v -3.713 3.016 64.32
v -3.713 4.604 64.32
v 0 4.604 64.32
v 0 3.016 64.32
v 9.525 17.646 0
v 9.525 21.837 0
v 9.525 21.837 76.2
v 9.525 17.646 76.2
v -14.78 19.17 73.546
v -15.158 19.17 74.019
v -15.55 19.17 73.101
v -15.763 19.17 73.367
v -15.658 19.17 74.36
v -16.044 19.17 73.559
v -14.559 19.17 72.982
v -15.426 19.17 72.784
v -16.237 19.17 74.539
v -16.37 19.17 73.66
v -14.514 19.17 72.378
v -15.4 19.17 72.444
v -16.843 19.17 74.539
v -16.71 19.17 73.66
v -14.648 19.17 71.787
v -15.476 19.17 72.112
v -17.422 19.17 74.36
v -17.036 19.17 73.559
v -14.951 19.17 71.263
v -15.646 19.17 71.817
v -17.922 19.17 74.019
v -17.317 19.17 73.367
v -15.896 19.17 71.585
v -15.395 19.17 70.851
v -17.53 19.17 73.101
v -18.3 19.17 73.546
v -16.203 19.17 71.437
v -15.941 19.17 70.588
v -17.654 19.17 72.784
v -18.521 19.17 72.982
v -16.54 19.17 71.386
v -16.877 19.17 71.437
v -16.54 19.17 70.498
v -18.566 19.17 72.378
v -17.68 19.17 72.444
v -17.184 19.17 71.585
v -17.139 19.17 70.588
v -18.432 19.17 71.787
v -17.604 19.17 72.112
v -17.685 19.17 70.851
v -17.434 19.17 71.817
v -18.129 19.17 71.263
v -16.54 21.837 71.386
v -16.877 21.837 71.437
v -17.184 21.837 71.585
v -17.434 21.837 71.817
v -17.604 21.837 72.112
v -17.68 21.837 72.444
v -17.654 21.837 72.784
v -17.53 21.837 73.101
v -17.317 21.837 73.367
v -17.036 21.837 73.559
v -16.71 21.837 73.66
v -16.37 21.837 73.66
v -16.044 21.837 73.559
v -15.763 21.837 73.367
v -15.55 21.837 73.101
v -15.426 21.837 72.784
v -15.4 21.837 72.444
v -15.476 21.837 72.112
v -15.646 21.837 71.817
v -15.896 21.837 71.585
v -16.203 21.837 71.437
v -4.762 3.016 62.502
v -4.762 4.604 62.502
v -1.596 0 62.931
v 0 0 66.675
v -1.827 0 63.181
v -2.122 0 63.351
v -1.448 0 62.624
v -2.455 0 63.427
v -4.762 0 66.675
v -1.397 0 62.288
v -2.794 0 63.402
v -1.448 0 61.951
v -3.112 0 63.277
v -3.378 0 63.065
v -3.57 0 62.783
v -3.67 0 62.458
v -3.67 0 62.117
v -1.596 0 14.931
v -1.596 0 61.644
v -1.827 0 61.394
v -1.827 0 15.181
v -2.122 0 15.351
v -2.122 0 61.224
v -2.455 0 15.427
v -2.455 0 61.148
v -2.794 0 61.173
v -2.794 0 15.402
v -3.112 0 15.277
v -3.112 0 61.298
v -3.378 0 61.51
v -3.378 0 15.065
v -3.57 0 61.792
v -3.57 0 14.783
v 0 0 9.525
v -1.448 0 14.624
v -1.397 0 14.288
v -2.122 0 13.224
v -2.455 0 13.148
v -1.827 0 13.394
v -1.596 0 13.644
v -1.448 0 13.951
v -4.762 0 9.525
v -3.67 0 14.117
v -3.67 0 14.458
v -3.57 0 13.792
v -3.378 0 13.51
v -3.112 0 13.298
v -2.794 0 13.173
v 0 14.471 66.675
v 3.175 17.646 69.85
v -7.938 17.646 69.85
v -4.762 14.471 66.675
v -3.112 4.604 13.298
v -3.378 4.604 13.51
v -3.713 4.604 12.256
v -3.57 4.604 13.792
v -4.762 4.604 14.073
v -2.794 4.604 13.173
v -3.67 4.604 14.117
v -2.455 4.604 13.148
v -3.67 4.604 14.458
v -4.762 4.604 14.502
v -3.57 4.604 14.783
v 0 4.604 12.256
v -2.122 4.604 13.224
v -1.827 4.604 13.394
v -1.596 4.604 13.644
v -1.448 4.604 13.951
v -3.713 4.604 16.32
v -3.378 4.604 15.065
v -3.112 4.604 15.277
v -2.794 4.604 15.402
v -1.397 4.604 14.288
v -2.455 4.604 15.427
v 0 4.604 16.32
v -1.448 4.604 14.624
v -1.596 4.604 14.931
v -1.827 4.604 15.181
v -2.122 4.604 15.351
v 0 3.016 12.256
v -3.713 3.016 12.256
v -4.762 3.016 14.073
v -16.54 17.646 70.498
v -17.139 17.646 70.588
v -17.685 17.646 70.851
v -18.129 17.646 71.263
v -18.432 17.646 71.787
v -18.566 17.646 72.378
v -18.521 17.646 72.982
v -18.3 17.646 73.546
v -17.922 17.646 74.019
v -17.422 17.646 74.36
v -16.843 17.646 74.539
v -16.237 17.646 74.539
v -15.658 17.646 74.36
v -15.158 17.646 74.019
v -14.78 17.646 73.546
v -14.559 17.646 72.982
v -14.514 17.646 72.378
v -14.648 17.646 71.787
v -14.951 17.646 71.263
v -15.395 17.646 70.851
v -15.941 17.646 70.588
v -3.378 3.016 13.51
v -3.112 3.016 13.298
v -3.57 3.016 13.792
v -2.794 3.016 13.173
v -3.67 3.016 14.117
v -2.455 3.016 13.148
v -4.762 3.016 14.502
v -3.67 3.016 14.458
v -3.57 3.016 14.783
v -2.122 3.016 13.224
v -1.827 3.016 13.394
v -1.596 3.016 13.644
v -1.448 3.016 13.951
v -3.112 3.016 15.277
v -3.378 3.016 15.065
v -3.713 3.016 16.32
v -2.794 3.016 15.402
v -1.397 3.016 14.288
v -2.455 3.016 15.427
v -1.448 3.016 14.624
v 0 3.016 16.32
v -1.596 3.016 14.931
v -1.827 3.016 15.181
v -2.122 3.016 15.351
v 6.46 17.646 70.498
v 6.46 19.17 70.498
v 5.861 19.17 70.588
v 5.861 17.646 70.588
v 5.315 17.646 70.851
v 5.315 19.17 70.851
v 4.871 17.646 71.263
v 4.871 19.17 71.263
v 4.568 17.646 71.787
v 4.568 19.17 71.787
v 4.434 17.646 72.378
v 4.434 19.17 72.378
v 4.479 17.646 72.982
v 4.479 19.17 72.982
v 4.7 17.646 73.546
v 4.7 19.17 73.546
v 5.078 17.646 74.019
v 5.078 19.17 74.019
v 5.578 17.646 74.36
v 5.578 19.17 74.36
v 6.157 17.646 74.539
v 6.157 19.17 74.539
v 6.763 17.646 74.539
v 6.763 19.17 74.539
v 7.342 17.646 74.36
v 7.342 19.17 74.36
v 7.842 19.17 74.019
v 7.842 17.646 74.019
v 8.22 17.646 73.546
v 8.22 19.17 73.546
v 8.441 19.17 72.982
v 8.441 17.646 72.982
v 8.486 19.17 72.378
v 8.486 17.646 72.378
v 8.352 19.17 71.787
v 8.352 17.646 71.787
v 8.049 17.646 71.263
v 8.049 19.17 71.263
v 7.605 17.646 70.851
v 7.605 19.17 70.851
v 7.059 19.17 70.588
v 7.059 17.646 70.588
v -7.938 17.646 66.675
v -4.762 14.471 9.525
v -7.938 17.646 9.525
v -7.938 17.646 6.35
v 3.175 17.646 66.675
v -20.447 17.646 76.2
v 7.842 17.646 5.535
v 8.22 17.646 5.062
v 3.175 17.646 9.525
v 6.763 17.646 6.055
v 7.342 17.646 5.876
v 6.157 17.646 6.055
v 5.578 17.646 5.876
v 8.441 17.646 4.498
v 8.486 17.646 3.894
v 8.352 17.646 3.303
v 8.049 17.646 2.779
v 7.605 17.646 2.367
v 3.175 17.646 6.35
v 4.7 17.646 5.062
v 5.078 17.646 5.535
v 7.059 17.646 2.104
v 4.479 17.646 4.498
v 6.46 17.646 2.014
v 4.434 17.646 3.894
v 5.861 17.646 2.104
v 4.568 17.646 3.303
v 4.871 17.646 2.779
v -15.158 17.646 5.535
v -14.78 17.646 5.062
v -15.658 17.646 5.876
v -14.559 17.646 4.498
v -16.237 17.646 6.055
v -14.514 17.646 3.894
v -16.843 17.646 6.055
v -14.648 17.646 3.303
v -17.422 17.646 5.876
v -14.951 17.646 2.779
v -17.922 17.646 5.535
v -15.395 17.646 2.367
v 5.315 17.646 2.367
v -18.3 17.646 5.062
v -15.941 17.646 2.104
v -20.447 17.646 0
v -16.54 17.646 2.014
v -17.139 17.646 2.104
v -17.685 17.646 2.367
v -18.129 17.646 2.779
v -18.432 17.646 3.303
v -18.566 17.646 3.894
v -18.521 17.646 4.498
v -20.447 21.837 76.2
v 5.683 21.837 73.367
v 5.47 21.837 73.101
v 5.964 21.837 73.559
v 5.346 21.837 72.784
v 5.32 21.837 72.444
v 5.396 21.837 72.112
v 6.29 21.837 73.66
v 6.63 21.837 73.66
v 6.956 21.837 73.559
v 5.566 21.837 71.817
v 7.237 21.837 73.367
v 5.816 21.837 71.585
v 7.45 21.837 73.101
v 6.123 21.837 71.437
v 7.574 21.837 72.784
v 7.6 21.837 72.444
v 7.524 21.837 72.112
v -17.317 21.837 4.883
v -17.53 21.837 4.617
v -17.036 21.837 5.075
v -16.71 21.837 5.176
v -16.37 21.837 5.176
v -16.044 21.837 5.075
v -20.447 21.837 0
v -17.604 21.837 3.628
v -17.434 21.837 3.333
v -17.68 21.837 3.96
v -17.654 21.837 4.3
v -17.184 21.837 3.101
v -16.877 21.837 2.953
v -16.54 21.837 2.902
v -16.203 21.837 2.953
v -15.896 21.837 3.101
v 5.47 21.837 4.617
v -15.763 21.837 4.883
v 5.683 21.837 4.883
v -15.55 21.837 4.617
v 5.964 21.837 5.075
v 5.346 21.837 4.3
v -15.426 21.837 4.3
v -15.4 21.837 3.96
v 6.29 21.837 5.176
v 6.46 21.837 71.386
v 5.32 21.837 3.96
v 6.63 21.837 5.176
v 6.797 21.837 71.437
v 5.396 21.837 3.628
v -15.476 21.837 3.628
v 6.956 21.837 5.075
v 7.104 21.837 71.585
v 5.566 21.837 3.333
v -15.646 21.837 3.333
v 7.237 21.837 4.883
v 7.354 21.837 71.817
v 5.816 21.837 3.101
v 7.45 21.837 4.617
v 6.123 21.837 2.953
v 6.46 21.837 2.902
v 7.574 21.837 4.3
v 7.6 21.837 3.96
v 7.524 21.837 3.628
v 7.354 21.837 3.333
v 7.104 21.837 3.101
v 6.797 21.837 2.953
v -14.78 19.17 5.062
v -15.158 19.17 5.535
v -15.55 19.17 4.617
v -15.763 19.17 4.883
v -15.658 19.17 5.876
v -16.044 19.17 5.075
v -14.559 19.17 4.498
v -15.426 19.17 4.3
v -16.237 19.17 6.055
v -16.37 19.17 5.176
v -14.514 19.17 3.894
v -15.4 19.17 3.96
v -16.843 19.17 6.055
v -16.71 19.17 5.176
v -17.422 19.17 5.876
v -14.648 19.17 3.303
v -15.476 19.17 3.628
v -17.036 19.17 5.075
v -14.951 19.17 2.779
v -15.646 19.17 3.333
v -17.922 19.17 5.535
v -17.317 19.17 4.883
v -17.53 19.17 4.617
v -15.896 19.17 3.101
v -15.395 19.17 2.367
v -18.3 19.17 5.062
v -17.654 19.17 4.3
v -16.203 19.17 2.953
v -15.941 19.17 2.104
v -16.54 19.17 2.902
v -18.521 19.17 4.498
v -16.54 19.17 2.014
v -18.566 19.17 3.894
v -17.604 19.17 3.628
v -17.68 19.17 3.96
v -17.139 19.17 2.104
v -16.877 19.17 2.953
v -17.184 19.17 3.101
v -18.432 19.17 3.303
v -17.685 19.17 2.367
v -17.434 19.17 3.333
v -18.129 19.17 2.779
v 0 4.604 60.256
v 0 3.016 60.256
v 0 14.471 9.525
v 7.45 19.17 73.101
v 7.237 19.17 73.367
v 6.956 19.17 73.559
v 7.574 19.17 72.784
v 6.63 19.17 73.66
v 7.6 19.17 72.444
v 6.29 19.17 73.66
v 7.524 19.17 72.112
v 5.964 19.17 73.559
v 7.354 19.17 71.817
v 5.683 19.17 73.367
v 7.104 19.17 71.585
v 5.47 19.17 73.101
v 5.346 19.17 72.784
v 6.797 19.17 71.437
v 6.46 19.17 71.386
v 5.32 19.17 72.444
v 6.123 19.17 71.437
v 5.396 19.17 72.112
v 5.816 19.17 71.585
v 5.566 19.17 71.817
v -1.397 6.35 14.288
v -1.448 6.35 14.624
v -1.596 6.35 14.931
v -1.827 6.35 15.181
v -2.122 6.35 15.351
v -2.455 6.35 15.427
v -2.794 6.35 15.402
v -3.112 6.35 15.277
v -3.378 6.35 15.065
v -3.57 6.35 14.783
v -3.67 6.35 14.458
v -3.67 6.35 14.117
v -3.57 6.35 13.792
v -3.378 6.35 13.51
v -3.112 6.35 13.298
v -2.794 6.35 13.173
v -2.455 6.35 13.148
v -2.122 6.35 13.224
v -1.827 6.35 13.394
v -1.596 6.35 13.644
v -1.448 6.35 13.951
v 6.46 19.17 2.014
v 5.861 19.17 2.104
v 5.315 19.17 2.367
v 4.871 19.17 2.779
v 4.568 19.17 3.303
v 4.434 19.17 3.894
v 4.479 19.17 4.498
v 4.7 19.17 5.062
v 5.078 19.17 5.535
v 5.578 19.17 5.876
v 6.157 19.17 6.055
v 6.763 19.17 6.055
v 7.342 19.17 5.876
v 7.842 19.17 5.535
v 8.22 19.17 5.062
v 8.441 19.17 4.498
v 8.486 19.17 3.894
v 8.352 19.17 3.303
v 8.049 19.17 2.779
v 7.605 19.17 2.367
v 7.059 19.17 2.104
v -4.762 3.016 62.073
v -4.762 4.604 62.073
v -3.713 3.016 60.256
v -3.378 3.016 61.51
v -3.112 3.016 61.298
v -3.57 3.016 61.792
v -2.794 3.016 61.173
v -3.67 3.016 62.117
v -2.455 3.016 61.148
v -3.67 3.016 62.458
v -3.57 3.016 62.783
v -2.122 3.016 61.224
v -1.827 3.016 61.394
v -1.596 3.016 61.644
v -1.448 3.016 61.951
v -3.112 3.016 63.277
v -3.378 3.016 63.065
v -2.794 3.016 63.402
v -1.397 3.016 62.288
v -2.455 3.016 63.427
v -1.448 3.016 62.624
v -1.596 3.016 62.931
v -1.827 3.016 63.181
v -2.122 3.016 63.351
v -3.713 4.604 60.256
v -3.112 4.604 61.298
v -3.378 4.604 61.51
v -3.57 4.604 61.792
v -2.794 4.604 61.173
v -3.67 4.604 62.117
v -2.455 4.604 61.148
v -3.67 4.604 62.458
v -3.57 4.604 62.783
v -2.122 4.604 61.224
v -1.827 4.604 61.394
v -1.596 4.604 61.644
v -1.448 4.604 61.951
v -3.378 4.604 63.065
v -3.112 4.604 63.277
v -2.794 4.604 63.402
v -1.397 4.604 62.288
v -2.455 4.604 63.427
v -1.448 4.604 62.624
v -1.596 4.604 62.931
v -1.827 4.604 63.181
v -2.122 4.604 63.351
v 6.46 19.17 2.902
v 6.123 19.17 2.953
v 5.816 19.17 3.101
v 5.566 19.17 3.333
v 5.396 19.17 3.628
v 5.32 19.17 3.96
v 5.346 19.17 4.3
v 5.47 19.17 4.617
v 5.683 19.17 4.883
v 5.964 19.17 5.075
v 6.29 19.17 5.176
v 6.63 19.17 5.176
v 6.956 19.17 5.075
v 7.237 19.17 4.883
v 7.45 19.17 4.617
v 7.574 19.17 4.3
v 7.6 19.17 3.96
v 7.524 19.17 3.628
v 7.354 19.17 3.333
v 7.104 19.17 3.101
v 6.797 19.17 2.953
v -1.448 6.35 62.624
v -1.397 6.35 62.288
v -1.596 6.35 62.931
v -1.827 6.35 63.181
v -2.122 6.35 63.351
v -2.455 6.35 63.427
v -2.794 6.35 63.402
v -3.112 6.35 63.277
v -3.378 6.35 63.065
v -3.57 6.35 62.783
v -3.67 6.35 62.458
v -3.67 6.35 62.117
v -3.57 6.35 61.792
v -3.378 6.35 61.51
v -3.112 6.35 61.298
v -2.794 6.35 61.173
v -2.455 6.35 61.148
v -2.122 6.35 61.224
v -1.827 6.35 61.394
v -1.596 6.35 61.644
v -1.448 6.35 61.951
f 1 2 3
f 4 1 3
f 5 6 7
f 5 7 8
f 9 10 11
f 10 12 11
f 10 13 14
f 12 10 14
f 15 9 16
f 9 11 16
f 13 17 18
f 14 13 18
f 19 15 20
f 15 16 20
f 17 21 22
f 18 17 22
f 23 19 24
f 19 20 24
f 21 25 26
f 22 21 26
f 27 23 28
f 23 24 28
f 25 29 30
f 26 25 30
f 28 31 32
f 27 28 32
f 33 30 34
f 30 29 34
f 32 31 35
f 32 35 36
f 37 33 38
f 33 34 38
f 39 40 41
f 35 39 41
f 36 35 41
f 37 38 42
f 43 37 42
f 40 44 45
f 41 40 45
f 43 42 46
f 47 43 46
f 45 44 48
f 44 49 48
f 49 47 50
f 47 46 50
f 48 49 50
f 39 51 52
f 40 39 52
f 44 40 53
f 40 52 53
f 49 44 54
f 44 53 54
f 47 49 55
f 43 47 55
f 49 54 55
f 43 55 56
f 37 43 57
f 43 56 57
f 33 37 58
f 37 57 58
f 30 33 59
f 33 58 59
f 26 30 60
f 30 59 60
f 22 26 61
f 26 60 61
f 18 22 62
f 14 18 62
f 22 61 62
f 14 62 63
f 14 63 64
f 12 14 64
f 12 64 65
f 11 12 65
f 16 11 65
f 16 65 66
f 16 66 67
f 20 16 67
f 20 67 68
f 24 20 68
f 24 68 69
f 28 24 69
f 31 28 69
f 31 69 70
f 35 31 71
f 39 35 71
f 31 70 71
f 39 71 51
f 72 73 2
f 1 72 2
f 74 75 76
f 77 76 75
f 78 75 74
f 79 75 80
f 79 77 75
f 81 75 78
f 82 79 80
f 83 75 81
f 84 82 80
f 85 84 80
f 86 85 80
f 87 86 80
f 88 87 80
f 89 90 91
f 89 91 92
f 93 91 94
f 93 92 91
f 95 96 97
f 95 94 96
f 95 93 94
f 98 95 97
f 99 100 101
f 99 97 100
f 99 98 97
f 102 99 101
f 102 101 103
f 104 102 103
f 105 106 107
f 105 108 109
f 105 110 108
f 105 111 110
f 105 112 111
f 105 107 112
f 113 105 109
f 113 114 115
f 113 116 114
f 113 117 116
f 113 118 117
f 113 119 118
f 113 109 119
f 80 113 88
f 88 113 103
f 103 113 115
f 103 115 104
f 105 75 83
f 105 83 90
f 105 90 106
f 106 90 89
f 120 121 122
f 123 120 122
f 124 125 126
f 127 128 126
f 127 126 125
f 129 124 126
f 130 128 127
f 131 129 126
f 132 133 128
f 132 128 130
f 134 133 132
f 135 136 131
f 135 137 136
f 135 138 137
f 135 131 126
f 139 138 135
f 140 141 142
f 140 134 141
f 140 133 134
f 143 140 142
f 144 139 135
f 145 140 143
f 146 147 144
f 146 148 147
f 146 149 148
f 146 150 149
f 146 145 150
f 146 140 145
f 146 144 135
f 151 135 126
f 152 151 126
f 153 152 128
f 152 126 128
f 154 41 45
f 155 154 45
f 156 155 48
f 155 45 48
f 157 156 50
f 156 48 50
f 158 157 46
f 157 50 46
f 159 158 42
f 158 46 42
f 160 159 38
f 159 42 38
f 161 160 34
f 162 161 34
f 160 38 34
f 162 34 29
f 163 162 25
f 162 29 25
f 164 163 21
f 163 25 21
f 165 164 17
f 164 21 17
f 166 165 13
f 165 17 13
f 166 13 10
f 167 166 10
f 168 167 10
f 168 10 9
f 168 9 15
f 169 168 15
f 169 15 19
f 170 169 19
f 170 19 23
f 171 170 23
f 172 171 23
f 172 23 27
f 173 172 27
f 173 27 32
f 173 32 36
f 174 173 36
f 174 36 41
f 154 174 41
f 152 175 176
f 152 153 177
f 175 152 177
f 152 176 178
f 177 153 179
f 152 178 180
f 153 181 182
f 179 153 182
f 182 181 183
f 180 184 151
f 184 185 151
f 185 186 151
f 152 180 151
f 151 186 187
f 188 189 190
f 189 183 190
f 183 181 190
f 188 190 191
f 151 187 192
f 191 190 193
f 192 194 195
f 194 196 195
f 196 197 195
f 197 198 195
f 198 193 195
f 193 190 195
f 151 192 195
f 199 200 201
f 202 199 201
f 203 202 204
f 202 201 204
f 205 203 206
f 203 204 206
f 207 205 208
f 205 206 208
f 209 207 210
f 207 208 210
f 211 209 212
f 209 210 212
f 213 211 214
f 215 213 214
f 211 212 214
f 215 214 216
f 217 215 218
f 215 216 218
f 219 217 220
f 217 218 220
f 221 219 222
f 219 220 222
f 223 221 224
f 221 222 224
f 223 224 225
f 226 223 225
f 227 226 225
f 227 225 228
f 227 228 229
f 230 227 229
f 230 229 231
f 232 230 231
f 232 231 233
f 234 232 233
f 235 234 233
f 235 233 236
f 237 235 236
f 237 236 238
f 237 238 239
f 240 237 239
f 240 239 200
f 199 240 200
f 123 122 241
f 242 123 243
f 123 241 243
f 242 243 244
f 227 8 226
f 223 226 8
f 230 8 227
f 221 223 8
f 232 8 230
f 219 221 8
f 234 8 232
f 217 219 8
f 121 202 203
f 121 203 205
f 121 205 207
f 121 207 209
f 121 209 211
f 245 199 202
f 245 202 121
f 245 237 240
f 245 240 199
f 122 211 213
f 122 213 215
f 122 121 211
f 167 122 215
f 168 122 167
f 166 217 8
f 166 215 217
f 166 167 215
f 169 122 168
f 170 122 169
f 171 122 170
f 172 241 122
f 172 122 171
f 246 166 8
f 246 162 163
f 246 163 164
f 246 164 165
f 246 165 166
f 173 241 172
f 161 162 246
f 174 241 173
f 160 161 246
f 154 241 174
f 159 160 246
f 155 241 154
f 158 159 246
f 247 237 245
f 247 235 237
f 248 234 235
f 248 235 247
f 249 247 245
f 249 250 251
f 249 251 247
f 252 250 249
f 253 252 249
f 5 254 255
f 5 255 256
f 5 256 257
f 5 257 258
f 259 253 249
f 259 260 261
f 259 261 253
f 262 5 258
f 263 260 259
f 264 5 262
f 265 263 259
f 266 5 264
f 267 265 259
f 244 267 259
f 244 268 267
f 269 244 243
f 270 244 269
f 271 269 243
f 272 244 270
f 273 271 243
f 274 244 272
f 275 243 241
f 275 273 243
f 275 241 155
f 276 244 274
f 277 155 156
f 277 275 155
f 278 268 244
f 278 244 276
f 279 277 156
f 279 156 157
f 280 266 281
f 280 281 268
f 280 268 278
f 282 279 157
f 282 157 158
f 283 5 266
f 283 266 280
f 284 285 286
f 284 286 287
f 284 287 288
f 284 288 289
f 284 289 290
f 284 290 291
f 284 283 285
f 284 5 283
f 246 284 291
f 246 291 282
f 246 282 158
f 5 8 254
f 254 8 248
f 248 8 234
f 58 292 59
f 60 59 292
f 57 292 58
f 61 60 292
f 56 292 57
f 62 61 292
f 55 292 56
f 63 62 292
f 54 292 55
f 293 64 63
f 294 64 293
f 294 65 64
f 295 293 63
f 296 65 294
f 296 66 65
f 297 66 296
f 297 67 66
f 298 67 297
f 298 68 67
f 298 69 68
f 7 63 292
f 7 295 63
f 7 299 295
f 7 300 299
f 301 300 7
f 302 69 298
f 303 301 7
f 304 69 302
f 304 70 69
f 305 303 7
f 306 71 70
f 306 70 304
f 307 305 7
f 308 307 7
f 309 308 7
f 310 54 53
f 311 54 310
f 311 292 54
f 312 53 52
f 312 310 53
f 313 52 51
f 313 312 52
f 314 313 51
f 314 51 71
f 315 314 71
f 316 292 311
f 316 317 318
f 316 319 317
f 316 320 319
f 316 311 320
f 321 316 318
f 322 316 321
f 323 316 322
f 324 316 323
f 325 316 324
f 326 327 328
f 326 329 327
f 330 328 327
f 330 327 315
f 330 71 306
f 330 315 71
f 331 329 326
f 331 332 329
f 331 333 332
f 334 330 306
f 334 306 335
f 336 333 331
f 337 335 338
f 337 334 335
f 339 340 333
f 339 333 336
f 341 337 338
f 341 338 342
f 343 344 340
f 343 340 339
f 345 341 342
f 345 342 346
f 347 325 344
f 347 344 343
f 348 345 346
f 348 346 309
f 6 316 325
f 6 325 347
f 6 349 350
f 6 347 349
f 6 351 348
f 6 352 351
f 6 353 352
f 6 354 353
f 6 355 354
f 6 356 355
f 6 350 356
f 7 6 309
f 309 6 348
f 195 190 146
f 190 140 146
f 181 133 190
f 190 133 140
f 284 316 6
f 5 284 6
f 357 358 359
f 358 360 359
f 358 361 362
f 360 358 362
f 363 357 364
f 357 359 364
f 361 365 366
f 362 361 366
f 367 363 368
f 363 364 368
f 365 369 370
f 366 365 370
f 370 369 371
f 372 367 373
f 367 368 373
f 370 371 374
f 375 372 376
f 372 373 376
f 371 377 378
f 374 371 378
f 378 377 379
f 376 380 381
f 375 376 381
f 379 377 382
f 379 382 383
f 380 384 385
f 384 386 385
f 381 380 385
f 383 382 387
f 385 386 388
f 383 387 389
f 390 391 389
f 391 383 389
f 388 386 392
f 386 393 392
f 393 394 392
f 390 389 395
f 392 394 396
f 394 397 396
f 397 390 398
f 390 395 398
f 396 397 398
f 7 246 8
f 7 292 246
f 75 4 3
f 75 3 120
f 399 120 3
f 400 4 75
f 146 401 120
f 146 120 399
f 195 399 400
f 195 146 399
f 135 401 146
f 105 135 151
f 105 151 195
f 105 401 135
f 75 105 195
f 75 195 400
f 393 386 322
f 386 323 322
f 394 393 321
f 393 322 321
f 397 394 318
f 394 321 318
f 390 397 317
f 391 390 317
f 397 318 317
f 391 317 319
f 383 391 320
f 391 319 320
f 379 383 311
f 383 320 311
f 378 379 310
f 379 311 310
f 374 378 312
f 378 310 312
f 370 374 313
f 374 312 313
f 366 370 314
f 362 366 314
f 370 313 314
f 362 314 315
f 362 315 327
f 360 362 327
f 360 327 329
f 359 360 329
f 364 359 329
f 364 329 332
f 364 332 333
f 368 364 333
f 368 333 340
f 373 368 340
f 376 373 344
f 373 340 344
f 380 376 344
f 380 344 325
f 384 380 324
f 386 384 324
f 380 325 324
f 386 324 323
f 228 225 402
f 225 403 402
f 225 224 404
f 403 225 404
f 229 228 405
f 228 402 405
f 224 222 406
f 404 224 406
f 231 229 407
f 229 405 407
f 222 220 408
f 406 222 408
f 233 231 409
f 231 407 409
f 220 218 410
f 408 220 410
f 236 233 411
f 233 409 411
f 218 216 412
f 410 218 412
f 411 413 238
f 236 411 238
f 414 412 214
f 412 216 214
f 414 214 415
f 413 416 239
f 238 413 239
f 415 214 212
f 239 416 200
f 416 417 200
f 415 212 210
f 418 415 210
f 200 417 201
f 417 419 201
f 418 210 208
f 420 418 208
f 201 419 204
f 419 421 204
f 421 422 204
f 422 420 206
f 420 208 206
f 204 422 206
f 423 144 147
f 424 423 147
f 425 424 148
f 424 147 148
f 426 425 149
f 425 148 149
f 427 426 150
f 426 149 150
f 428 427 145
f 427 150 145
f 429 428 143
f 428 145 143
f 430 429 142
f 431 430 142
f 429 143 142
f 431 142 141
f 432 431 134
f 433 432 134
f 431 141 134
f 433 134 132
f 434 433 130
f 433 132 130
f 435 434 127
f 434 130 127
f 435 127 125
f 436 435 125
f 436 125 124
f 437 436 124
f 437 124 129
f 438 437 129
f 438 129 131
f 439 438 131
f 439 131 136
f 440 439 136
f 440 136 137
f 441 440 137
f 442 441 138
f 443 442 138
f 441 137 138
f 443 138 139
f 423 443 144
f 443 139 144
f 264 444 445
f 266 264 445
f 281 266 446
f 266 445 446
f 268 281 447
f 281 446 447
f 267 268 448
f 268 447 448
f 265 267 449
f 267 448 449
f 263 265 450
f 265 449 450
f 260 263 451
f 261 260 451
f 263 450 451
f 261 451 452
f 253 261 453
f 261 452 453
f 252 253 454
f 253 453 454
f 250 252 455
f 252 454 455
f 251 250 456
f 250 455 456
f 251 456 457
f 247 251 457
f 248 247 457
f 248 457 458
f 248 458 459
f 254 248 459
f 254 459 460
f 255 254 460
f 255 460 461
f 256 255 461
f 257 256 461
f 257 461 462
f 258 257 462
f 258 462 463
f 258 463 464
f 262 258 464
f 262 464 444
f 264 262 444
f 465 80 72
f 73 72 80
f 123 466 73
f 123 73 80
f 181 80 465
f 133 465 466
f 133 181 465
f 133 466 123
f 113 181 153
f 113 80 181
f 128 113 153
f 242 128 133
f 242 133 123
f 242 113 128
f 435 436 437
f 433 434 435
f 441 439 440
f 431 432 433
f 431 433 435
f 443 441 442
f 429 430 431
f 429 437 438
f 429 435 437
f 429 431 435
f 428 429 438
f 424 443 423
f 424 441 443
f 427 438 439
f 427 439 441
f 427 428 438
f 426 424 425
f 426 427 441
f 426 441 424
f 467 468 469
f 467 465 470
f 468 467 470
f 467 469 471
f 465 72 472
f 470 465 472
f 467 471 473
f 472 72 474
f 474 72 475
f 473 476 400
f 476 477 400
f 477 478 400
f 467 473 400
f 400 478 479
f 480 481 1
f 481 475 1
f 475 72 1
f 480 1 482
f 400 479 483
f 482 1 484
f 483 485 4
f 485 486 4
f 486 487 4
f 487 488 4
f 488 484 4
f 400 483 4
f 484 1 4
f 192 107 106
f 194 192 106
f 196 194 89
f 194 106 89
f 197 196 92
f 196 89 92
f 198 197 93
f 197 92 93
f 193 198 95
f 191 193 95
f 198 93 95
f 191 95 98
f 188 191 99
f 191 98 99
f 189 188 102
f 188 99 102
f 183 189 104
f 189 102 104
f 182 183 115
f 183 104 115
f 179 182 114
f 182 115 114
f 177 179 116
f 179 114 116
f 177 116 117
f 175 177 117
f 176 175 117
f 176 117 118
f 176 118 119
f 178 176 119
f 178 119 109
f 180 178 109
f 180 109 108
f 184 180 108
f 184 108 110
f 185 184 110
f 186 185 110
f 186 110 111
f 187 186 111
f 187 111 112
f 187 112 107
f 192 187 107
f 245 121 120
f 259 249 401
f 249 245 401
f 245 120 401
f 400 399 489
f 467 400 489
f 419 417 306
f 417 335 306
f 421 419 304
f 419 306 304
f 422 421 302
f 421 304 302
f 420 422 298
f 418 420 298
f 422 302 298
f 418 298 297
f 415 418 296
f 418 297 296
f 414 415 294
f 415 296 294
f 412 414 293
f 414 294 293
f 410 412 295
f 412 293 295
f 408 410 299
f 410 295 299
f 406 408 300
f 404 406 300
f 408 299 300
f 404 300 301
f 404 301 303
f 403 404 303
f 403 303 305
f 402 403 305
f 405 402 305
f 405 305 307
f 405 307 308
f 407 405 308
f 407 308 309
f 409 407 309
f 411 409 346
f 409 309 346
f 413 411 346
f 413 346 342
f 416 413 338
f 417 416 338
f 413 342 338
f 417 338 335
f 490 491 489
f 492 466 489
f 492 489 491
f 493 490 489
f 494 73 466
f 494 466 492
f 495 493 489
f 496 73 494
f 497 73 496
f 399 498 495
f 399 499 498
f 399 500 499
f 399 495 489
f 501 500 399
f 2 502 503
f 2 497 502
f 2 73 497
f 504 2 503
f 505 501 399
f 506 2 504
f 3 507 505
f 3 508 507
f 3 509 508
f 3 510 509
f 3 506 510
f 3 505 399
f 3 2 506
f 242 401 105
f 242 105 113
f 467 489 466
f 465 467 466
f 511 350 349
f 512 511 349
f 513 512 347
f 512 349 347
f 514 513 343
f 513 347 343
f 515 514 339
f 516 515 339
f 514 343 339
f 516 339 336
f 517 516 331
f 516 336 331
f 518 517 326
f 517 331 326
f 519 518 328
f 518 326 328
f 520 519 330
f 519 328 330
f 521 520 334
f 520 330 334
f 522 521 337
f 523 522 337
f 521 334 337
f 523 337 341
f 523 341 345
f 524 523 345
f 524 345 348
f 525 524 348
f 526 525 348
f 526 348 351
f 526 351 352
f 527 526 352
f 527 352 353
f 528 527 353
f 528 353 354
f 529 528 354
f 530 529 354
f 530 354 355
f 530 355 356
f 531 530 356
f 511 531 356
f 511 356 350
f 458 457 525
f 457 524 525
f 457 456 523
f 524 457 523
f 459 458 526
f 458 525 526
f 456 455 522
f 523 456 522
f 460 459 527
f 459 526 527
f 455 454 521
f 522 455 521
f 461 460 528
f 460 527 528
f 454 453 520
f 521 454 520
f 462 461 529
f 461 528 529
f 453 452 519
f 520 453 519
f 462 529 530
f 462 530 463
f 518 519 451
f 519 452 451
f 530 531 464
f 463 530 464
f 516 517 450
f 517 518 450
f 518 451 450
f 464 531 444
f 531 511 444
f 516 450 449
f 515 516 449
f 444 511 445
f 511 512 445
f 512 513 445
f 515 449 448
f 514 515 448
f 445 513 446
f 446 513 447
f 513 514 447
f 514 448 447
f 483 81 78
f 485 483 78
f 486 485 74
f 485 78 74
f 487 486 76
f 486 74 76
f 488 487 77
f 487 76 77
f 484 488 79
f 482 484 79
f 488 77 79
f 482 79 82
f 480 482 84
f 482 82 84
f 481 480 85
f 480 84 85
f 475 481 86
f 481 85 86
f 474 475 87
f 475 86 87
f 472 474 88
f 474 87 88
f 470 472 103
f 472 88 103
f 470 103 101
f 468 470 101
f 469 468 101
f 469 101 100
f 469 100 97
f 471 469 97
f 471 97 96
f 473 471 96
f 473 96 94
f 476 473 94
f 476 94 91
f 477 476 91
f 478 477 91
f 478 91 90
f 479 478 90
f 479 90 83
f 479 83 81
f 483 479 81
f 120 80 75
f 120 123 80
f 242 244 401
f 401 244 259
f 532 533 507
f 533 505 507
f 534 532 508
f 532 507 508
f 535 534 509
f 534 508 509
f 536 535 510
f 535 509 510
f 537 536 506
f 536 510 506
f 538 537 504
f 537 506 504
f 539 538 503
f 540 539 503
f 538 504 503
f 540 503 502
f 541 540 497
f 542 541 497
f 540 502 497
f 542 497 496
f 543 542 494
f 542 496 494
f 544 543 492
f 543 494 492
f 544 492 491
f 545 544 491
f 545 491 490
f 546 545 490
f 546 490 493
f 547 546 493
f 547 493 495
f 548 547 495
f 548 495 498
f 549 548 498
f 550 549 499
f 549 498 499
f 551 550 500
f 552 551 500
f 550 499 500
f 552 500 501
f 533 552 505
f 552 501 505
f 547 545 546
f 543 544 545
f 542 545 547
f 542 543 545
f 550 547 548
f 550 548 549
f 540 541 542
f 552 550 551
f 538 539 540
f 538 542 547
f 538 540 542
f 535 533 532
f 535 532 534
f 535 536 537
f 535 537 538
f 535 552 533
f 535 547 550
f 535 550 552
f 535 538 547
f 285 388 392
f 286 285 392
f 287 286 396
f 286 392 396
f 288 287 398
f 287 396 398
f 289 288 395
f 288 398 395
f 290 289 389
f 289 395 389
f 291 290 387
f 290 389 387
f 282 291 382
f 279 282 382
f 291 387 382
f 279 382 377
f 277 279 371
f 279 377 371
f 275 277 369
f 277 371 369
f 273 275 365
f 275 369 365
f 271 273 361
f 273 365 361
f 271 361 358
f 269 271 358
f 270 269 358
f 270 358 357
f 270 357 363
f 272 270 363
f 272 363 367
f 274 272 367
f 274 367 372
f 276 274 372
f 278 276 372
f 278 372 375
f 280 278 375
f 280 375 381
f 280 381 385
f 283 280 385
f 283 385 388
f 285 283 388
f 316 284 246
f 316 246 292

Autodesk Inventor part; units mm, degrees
ref_plane "YZ Plane" through (0, 0, 0) normal (1, 0, 0) x (0, 1, 0)
ref_plane "XZ Plane" through (0, 0, 0) normal (0, 1, 0) x (-1, 0, 0)
sketch "Sketch1" plane through (0, 0, 0) normal (0, 0, 1) x (1, 0, 0)
  line L0 (0, 0) -> (-4.7625, 0)
  line L1 (-4.7625, 0) -> (-4.7625, 17.646)
  line L2 (0, 17.646) -> (0, 0)
  line L3 (-20.447, 21.837) -> (9.525, 21.837)
  line L4 (9.525, 21.837) -> (9.525, 17.646)
  line L5 (-20.447, 17.646) -> (-20.447, 21.837)
  line L6 (9.525, 17.646) -> (0, 17.646)
  line L7 (-4.7625, 17.646) -> (-20.447, 17.646)
  point P0 (-2.3813, 0)
  dimension "d3" = 4.7625
  dimension "d4" = 4.191
  dimension "d5" = 29.972
  dimension "d6" = 21.837
  dimension "d8" = 9.525
extrude "Extrusion1" add sketch "Sketch1" along normal blind 76.2
sketch "Sketch2" plane through (-4.7625, 0, 0) normal (0, -1, 0) x (1, 0, 0)
  line L0 (0, 0) -> (4.7625, 0) projected
  line L1 (4.7625, 0) -> (4.7625, 76.2) projected
  line L2 (0, 76.2) -> (4.7625, 76.2) projected
  line L3 (0, 0) -> (0, 76.2) projected
  line L4 (0, 76.2) -> (4.7625, 76.2) projected
  circle A0 centre (2.2225, 62.2875) radius 2.2
  circle A1 centre (2.2225, 14.2875) radius 2.2
  circle A2 centre (2.2225, 14.2875) radius 1.143
  circle A3 centre (2.2225, 62.2875) radius 1.143
  point P0 (2.3813, 76.2)
  dimension "d52" = 2.286
  dimension "d53" = 2.286
chamfer "Chamfer1" distance 3.175 angle 45 2 edges at (-4.7625, 17.646, 38.1) (0, 17.646, 38.1)
extrude "Extrusion2" cut sketch "Sketch2" against normal blind 6.35 contours A2 | A3
ref_plane "Work Plane1" through (-4.7625, 3.81, 0) normal (0, -1, 0) x (1, 0, 0)
sketch "Sketch3" plane through (-4.7625, 3.81, 0) normal (0, -1, 0) x (1, 0, 0)
  circle A0 centre (2.2225, 62.2875) radius 1.016
  line L0 (4.7625, 60.2555) -> (1.0493, 60.2555)
  line L1 (1.0493, 60.2555) -> (-0.1239, 62.2875)
  line L2 (-0.1239, 62.2875) -> (1.0493, 64.3195)
  line L3 (1.0493, 64.3195) -> (4.7625, 64.3195)
  circle A1 centre (2.2225, 14.2875) radius 1.016
  line L4 (4.7625, 12.2555) -> (1.0493, 12.2555)
  line L5 (1.0493, 12.2555) -> (-0.1239, 14.2875)
  line L6 (-0.1239, 14.2875) -> (1.0493, 16.3195)
  line L7 (1.0493, 16.3195) -> (4.7625, 16.3195)
  line L8 (4.7625, 76.2) -> (4.7625, 0) projected
  circle A2 centre (2.2225, 14.2875) radius 1.143 projected
  circle A3 centre (2.2225, 62.2875) radius 1.143 projected
  dimension "d21" = 4.064
  dimension "d22" = 4.064
extrude "Extrusion3" cut sketch "Sketch3" against normal mid plane 1.5875 contours L0 L1 L2 L3 L8 | L8 L4 L5 L6 L7 | A1 | A2 | A3
sketch "Sketch5" plane through (-20.447, 17.646, 0) normal (0, -1, 0) x (1, 0, 0)
  circle A0 centre (3.907, 72.5295) radius 1 projected
  circle A1 centre (26.907, 72.5295) radius 1 projected
  circle A2 centre (26.907, 4.0455) radius 1 projected
  circle A3 centre (3.907, 4.0455) radius 1 projected
  point P0 (20.447, 0)
hole "Hole1" at (-16.54, 17.646, 72.5295) at (6.46, 17.646, 72.5295) at (6.46, 17.646, 4.0455) at (-16.54, 17.646, 4.0455) direction (0, 1, 0) diameter 2.286 depth 25.4 tip angle 118 counterbore diameter 4.064 counterbore depth 1.524
sketch "Sketch6" plane through (0, 0, 76.2) normal (0, 0, 1) x (1, 0, 0)
  line L0 (3.175, 17.646) -> (9.525, 17.646) projected
  line L1 (9.525, 17.646) -> (9.525, 21.837) projected
  line L2 (9.525, 21.837) -> (-20.447, 21.837) projected
  line L3 (-20.447, 21.837) -> (-20.447, 17.646) projected
  line L4 (-20.447, 17.646) -> (-7.9375, 17.646) projected
  line L5 (-4.7625, 14.471) -> (-7.9375, 17.646) projected
  line L6 (-4.7625, 14.471) -> (-4.7625, 0) projected
  line L7 (-4.7625, 0) -> (0, 0) projected
  line L8 (0, 0) -> (0, 14.471) projected
  line L9 (3.175, 17.646) -> (0, 14.471) projected
  line L10 (3.175, 17.646) -> (9.525, 17.646) projected
  line L11 (-7.9375, 17.646) -> (3.175, 17.646)
extrude "Extrusion5" cut sketch "Sketch6" against normal blind 9.525 contours L9 L8 L7 L6 L5 L11
sketch "Sketch7" plane through (0, 0, 0) normal (0, 0, -1) x (-1, 0, 0)
  line L0 (0, 14.471) -> (-3.175, 17.646) projected
  line L1 (0, 0) -> (0, 14.471) projected
  line L2 (4.7625, 0) -> (0, 0) projected
  line L3 (4.7625, 14.471) -> (4.7625, 0) projected
  line L4 (7.9375, 17.646) -> (4.7625, 14.471) projected
  line L5 (20.447, 17.646) -> (7.9375, 17.646) projected
  line L6 (20.447, 21.837) -> (20.447, 17.646) projected
  line L7 (-9.525, 21.837) -> (20.447, 21.837) projected
  line L8 (-9.525, 17.646) -> (-9.525, 21.837) projected
  line L9 (-3.175, 17.646) -> (-9.525, 17.646) projected
  line L10 (-3.175, 17.646) -> (8.255, 17.646)
  line L11 (20.447, 17.646) -> (-9.525, 17.646) projected
extrude "Extrusion6" cut sketch "Sketch7" against normal blind 9.525 contours L0 L10 L4 L3 L2 L1
chamfer "Chamfer2" distance 3.175 angle 45 2 edges at (-2.3813, 17.646, 9.525) (-2.3813, 17.646, 66.675)
properties part number "PCB BRACE"
